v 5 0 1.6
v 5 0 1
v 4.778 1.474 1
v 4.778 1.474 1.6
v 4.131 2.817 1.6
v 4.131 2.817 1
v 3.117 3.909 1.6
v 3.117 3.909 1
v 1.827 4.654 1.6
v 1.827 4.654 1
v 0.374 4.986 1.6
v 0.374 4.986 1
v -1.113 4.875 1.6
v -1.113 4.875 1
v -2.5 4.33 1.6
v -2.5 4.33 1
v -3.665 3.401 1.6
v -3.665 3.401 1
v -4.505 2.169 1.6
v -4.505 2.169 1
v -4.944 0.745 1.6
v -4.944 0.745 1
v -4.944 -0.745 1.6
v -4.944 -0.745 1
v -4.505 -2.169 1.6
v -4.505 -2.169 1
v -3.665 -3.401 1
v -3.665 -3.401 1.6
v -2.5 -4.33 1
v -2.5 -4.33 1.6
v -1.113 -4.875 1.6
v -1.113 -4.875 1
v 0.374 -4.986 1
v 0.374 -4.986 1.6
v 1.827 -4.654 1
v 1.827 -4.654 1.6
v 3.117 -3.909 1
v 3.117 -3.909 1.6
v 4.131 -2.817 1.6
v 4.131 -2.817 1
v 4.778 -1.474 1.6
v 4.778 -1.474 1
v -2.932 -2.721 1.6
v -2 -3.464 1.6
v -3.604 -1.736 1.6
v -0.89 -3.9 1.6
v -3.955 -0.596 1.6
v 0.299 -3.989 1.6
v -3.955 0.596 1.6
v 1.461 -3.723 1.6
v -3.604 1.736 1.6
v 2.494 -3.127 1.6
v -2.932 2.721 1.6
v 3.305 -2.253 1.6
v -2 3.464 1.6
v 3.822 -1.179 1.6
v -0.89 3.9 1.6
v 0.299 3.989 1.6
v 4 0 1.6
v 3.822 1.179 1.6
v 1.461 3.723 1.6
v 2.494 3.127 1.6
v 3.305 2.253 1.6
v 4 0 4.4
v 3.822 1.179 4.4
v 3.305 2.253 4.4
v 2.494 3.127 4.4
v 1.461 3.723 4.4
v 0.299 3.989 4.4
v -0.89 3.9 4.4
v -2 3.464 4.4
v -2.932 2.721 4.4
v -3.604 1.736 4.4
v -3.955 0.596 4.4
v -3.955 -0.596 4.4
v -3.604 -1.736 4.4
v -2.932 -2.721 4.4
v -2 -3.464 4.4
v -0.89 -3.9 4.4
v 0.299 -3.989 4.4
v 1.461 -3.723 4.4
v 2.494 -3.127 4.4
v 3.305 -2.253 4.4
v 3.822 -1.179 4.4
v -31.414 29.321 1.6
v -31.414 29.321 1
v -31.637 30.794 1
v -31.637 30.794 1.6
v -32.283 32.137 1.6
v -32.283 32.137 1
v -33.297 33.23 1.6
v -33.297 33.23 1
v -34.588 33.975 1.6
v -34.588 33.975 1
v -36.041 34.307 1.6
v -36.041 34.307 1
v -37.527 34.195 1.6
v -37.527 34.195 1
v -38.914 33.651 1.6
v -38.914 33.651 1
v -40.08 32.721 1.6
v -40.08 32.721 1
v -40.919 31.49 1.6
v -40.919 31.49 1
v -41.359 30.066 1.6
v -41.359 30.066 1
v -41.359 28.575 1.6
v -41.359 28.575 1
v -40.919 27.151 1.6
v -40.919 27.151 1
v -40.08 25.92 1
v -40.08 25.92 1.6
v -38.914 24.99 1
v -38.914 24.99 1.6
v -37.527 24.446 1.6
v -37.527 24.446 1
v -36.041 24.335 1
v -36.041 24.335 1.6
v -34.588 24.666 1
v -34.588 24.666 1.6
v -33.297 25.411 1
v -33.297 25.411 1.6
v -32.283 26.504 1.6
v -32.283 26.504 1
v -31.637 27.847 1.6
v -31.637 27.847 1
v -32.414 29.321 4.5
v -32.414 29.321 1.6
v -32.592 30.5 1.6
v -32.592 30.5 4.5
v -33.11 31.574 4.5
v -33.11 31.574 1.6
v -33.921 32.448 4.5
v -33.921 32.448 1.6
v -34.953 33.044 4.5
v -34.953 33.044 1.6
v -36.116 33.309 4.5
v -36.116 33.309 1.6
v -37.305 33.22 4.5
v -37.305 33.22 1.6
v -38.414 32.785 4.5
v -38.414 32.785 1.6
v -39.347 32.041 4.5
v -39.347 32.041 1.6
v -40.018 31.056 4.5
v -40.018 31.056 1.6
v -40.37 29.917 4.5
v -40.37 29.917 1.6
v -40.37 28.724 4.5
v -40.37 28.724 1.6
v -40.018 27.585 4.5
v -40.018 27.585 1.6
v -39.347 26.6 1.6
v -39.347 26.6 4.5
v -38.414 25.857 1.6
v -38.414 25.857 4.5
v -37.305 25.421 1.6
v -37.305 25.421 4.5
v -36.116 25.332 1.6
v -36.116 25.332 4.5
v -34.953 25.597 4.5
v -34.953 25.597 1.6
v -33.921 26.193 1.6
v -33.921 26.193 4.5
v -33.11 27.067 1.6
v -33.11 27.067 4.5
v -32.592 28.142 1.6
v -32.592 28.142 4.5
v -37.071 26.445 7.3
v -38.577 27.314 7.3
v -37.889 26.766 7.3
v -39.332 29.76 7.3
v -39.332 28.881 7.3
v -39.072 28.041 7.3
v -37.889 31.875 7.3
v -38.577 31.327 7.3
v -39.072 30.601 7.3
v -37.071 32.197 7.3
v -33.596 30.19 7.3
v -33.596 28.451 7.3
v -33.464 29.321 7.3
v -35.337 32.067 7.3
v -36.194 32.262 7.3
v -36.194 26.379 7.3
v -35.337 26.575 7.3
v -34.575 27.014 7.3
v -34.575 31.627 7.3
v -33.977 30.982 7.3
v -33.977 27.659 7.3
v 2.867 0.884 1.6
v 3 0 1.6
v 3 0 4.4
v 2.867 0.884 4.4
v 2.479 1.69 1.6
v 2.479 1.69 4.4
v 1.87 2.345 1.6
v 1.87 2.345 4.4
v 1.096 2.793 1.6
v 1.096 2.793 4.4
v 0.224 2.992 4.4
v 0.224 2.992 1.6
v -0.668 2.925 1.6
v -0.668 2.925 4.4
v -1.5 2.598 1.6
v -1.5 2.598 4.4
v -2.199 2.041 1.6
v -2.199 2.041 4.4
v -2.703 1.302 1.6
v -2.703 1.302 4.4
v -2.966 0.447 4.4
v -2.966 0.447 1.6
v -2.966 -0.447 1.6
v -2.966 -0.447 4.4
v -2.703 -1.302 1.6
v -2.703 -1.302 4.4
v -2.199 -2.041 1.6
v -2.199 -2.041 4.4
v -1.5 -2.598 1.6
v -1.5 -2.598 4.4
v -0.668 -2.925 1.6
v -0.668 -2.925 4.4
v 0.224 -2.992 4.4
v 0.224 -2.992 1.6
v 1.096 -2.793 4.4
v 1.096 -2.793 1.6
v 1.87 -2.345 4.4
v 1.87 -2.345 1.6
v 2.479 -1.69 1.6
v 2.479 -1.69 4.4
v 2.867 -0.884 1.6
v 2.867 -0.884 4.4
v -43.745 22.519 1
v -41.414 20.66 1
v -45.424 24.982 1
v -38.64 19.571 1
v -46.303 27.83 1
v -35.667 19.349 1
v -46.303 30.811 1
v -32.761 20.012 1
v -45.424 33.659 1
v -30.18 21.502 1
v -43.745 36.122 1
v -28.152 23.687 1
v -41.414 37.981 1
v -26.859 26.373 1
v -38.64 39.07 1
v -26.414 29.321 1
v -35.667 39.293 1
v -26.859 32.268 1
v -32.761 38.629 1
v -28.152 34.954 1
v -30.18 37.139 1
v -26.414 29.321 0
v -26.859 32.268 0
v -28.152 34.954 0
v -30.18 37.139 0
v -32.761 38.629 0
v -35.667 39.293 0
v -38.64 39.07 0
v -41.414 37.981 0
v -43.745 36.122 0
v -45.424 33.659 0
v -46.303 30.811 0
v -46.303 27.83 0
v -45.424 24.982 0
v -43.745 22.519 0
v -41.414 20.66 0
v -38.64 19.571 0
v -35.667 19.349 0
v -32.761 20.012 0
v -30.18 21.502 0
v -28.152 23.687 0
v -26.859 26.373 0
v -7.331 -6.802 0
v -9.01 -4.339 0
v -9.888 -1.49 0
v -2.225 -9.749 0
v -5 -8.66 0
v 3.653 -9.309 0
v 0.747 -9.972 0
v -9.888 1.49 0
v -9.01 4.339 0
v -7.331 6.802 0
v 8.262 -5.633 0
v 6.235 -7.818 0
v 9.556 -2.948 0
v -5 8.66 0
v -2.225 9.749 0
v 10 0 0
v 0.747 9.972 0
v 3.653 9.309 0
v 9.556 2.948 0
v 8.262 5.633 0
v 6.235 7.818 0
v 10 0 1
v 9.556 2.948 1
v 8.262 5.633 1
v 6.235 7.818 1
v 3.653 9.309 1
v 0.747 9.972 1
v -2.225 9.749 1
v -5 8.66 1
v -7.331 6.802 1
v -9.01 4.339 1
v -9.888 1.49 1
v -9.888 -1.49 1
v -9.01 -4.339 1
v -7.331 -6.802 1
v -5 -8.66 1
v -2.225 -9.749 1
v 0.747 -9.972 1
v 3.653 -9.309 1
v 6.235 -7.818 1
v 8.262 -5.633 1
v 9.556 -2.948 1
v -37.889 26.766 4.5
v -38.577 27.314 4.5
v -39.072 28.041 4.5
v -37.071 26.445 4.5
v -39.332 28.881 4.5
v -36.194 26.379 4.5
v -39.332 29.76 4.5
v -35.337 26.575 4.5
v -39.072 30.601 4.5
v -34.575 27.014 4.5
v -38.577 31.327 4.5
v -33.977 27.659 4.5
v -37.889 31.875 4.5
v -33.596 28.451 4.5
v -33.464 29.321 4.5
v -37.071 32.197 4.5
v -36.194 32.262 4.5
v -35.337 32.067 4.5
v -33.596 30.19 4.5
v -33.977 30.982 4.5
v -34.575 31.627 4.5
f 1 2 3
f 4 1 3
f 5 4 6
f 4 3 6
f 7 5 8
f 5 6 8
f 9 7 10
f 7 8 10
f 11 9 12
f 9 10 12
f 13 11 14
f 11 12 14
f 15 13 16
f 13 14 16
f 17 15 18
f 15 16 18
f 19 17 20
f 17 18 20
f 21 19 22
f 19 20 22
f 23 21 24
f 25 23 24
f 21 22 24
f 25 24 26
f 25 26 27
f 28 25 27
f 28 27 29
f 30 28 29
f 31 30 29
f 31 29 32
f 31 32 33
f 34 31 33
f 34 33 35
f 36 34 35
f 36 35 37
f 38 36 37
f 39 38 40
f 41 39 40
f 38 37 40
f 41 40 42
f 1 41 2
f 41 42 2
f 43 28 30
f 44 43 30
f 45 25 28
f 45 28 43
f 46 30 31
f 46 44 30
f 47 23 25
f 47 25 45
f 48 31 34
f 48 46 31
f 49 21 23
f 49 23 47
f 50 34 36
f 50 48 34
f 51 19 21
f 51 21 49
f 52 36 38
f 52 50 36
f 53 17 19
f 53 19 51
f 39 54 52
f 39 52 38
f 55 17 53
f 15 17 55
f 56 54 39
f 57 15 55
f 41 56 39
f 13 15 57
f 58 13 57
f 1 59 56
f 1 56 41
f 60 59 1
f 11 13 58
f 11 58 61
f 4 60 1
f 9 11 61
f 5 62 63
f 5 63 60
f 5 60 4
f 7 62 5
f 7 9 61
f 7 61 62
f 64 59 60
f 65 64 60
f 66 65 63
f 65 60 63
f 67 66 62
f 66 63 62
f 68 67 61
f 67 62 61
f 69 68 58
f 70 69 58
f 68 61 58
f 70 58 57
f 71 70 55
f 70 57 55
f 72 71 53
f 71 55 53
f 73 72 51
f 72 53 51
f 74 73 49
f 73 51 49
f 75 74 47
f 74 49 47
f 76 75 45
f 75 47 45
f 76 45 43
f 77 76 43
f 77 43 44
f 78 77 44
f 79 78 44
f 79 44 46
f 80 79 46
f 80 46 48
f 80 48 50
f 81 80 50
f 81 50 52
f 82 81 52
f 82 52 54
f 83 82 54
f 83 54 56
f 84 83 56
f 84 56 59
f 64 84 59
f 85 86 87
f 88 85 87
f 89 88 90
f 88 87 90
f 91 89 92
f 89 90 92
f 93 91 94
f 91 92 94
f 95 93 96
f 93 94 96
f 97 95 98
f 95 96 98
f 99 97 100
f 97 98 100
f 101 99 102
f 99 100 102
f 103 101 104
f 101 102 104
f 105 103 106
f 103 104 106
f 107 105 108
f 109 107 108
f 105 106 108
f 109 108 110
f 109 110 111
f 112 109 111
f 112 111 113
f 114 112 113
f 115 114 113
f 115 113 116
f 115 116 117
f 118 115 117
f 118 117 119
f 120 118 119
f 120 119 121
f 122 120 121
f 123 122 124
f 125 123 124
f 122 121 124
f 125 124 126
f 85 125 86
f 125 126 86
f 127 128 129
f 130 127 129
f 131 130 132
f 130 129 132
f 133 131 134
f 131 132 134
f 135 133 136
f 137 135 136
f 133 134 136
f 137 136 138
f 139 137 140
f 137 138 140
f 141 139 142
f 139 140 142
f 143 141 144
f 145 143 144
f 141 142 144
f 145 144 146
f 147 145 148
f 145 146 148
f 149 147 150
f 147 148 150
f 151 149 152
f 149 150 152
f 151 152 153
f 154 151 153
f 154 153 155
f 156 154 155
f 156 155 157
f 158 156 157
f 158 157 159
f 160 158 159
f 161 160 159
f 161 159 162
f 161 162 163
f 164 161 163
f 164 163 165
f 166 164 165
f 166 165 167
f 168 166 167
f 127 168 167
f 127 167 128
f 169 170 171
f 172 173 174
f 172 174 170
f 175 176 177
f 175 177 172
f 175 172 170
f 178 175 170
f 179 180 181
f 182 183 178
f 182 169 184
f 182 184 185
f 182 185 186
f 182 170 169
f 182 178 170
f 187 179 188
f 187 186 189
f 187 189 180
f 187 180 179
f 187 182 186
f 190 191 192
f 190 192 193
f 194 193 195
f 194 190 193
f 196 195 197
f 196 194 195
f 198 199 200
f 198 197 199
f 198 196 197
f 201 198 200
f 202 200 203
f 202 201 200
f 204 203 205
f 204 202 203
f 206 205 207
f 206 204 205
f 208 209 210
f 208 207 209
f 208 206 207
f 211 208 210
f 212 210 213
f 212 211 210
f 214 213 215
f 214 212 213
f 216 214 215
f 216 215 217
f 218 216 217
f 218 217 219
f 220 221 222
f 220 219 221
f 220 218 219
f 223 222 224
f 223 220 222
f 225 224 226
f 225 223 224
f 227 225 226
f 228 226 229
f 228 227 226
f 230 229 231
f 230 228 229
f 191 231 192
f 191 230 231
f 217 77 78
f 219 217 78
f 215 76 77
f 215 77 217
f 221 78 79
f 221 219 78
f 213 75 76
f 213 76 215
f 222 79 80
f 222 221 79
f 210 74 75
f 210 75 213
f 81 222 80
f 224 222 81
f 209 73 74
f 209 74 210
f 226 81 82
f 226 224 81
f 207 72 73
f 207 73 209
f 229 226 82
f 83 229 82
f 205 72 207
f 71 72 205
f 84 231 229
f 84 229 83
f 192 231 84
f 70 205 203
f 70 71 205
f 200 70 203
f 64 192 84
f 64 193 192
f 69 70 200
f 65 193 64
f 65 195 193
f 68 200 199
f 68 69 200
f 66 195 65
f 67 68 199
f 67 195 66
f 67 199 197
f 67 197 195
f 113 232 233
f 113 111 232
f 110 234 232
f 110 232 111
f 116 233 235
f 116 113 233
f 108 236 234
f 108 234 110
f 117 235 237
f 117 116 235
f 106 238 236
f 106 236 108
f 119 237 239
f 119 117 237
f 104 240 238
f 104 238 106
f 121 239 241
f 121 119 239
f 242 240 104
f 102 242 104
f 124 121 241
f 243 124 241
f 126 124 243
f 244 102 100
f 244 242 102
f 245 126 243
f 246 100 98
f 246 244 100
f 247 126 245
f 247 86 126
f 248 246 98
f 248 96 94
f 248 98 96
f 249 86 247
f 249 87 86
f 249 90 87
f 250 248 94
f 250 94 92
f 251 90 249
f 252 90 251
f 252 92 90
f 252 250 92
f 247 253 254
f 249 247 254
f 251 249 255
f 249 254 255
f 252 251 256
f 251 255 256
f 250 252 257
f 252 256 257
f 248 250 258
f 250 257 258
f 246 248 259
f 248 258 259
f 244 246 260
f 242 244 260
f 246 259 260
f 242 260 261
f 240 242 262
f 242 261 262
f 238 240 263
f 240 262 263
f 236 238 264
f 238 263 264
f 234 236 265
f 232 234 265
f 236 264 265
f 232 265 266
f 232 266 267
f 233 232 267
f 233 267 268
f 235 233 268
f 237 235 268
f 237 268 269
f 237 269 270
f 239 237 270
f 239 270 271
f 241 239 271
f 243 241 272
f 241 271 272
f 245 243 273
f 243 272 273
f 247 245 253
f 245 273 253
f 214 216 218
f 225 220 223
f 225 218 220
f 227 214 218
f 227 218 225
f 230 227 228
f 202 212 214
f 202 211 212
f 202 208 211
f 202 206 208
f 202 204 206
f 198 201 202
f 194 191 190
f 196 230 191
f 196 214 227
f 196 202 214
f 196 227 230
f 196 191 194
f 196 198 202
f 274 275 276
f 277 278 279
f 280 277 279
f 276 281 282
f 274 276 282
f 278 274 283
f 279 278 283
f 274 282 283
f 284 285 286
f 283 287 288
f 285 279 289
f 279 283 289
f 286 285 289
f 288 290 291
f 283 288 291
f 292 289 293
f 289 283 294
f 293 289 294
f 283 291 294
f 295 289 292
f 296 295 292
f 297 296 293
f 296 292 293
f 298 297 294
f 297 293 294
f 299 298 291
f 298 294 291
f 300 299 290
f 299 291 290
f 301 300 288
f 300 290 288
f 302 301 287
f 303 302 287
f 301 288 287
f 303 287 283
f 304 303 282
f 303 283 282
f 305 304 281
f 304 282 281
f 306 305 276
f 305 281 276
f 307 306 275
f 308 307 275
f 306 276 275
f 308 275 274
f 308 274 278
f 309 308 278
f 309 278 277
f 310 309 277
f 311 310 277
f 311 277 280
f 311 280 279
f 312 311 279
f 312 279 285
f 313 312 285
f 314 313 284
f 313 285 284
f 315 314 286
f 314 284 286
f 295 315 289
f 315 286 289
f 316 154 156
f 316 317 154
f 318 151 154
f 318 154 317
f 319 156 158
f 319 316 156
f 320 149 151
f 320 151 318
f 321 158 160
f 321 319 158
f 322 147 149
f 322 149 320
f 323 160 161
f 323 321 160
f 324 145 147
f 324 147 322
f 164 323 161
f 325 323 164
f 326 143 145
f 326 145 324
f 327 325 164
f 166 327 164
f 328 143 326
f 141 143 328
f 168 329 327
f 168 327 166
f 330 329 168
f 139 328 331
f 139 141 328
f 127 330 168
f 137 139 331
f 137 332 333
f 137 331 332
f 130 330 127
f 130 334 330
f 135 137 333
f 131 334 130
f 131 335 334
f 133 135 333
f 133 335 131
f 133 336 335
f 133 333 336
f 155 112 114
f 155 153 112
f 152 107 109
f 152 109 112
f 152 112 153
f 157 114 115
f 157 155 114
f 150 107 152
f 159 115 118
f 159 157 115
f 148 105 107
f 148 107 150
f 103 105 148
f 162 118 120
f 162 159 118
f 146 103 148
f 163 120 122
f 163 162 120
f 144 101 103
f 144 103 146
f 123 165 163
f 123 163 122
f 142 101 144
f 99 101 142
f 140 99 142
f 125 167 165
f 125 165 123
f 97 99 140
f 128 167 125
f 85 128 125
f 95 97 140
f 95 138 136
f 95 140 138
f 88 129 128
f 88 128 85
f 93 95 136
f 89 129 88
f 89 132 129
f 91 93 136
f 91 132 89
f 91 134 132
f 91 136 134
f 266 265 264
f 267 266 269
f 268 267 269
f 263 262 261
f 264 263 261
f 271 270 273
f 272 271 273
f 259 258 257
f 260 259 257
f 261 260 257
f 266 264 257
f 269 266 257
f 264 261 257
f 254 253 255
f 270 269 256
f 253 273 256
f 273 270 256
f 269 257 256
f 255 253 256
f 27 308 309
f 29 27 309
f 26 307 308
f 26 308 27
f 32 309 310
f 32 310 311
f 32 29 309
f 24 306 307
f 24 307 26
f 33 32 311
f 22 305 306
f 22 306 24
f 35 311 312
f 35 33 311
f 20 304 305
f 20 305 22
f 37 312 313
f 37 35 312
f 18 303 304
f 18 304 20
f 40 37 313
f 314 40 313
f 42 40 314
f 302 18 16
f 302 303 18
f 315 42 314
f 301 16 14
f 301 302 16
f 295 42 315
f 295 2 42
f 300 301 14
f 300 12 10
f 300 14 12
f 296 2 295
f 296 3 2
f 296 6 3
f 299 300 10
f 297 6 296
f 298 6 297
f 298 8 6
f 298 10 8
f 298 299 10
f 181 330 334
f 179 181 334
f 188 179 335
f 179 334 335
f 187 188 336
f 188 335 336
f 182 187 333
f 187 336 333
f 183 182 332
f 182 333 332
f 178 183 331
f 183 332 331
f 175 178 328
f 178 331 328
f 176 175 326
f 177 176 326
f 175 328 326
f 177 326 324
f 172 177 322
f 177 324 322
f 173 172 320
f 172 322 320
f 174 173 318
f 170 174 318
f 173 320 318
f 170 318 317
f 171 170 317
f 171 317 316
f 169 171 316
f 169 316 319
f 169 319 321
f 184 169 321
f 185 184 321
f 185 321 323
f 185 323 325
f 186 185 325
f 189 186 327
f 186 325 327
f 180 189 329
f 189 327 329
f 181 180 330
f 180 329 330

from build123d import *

# Parameters (mm, degrees)
F0_R      = 10
F1_DEPTH  = 1
F2_R      = 4
F3_DEPTH  = 3.4
F4_T      = -1
F5_R      = 5
F6_DEPTH  = 0.6
F7_R      = 10
F8_DEPTH  = 1
F9_R      = 4
F10_DEPTH = 3.5
F11_R     = 2.95
F12_DEPTH = 2.8
F13_R     = 5
F13_R_2   = 4
F14_DEPTH = 0.6


with BuildPart() as f1:
    # F0 (on Top) → F1 (new body)
    with BuildSketch(Plane.XY):
        Circle(F0_R)
    extrude(amount=F1_DEPTH)

    # F2 (on face) → F3 (join)
    with BuildSketch(Plane.XY.offset(1)):
        Circle(F2_R)
    extrude(amount=F3_DEPTH)

    # F4
    f4_openings = [f1.faces().sort_by_distance(p)[0] for p in [
        (0, 0, 4.4),
    ]]
    offset(amount=F4_T, openings=f4_openings, kind=Kind.INTERSECTION)

    # F5 (on face) → F6 (join)
    with BuildSketch(Plane.XY.offset(1)):
        Circle(F5_R)
    extrude(amount=F6_DEPTH)


with BuildPart() as f8:
    # F7 (on Top) → F8 (new body)
    with BuildSketch(Plane.XY):
        with Locations((-36.4144779742, 29.3206144124)):
            Circle(F7_R)
    extrude(amount=F8_DEPTH)

    # F9 (on face) → F10 (join)
    with BuildSketch(Plane.XY.offset(1)):
        with Locations((-36.4144779742, 29.3206144124)):
            Circle(F9_R)
    extrude(amount=F10_DEPTH)

    # F11 (on face) → F12 (join)
    with BuildSketch(Plane.XY.offset(4.5)):
        with Locations((-36.4144779742, 29.3206144124)):
            Circle(F11_R)
    extrude(amount=F12_DEPTH)

    # F13 (on face) → F14 (join)
    with BuildSketch(Plane.XY.offset(1)):
        with Locations((-36.4144779742, 29.3206144124)):
            Circle(F13_R)
        with Locations((-36.4144779742, 29.3206144124)):
            Circle(F13_R_2, mode=Mode.SUBTRACT)
    extrude(amount=F14_DEPTH)


solid = Compound([f1.part, f8.part])
